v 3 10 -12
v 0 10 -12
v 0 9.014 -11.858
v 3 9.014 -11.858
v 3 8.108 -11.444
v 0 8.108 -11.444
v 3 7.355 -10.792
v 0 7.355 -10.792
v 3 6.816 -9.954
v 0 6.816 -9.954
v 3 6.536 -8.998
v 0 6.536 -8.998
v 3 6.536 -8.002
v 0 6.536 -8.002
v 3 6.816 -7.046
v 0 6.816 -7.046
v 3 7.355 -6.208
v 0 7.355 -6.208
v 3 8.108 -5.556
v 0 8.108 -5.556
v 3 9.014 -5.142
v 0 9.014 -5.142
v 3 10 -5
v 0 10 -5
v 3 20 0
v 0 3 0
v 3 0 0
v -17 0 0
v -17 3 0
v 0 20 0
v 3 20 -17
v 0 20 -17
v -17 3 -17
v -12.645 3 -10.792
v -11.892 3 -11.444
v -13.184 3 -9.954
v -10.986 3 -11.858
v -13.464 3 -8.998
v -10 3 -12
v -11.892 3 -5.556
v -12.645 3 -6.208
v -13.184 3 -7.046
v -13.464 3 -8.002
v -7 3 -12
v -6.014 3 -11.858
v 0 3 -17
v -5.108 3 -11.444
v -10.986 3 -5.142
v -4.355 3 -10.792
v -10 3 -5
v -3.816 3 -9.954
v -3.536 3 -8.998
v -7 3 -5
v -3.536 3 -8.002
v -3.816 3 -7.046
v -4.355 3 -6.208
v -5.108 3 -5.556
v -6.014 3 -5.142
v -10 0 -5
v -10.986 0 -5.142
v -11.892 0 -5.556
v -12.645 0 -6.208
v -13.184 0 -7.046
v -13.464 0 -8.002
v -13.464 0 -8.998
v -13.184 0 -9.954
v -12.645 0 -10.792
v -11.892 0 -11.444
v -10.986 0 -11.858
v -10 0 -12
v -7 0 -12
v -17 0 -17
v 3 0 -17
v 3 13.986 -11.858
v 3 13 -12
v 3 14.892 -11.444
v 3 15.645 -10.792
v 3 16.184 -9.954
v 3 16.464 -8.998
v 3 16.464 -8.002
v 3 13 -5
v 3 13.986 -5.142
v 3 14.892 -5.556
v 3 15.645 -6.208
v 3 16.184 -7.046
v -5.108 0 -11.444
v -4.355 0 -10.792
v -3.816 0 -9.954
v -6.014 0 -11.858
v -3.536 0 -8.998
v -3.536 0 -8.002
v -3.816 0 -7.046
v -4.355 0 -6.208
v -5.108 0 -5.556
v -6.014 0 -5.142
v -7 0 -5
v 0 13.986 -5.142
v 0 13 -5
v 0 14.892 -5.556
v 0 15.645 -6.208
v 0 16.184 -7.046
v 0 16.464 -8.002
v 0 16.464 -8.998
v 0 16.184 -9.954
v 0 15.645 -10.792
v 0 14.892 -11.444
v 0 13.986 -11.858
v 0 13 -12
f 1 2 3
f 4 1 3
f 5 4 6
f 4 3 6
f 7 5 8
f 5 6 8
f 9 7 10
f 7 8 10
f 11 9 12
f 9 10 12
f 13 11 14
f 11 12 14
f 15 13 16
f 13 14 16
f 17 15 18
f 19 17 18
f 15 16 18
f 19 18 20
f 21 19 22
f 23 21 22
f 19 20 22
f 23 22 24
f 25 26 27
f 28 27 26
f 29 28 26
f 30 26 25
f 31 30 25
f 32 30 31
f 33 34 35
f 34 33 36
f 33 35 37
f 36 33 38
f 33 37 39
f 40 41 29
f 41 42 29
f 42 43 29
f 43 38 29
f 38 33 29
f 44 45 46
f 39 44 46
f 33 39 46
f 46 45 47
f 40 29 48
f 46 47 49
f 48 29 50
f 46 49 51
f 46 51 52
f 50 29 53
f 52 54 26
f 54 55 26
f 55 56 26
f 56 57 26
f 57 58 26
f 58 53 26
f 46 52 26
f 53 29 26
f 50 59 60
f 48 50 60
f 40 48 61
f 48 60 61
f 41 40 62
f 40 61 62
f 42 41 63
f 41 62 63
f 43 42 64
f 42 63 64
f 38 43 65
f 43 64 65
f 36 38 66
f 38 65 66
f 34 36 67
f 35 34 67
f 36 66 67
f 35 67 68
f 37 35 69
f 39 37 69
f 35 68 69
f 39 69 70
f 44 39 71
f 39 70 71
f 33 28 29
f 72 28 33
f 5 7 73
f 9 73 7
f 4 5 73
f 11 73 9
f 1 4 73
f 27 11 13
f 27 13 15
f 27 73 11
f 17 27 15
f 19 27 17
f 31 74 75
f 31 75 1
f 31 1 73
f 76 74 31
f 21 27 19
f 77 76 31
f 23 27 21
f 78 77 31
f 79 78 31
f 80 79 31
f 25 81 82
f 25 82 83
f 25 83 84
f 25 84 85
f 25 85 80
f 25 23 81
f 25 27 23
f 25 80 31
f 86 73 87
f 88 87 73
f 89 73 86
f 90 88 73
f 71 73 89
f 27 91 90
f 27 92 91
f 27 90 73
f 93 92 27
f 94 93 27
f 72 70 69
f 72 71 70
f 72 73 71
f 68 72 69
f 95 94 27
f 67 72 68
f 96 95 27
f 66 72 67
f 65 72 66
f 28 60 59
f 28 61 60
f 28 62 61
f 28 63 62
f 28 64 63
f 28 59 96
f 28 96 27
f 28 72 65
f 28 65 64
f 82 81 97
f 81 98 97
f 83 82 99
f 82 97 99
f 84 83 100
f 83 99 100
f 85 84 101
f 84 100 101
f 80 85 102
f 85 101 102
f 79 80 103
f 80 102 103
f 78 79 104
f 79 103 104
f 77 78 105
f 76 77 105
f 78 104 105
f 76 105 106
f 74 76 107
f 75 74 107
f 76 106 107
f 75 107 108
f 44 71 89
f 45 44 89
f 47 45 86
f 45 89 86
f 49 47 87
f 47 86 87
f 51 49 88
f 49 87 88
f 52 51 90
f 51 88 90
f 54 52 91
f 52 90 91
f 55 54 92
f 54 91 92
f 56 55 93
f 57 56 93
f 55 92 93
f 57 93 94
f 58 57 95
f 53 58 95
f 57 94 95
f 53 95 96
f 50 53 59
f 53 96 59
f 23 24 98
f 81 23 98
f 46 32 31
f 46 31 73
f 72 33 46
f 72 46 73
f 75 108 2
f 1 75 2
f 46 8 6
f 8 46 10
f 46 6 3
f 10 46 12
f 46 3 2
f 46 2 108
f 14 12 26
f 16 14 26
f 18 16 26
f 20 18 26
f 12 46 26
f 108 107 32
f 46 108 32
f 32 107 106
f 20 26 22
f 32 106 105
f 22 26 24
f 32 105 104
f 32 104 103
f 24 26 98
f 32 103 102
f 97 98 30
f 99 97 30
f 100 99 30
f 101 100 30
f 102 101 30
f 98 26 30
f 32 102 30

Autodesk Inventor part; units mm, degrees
ref_plane "YZ Plane" through (0, 0, 0) normal (1, 0, 0) x (0, 1, 0)
ref_plane "XZ Plane" through (0, 0, 0) normal (0, 1, 0) x (-1, 0, 0)
ref_plane "XY Plane" through (0, 0, 0) normal (0, 0, 1) x (1, 0, 0)
sketch "Sketch1" plane through (0, 0, 0) normal (1, 0, 0) x (0, 1, 0)
  line L0 (0, 0) -> (20, 0)
  line L1 (20, 0) -> (20, -17)
  line L2 (20, -17) -> (0, -17)
  line L3 (0, -17) -> (0, 0)
  dimension "d0" = 20
  dimension "d1" = 17
extrude "Extrusion1" add sketch "Sketch1" along normal blind 3
sketch "Sketch2" plane through (0, 0, -17) normal (0, -1, 0) x (1, 0, 0)
  line L0 (3, 0) -> (3, 17) projected
  line L1 (3, 17) -> (-17, 17)
  line L2 (-17, 17) -> (-17, 0)
  line L3 (-17, 0) -> (3, 0)
  line L4 (3, 0) -> (3, 17)
  line L5 (-17, 17) -> (-17, 0)
  line L6 (0, 0) -> (-17, 0)
  line L7 (0, 17) -> (0, 0)
  line L8 (-17, 17) -> (0, 17)
  line L9 (-10, 8.5) -> (-7, 8.5) construction
  line L10 (-10, 5) -> (-7, 5)
  line L11 (-7, 12) -> (-10, 12)
  arc A0 (-10, 12) -> (-10, 5) centre (-10, 8.5) ccw
  arc A1 (-7, 5) -> (-7, 12) centre (-7, 8.5) ccw
  point P0 (0, 17)
  point P1 (0, 0)
  point P2 (-8.5, 8.5)
  dimension "d4" = 20
  dimension "d15" = 7
  dimension "d16" = 3
  dimension "d17" = 7
  dimension "d18" = 17
  dimension "d19" = 17
  dimension "d20" = 8.5
extrude "Extrusion2" add sketch "Sketch2" against normal blind 3 contours L3 L7 L1 L0 | L3 L2 L1 L7 | A0 L11 A1 L10
sketch "Sketch3" plane through (0, 0, 0) normal (-1, 0, 0) x (0, 0, 1)
  line L0 (-17, 3) -> (0, 3)
  line L1 (0, 20) -> (0, 3)
  line L2 (-17, 20) -> (0, 20)
  line L3 (-17, 3) -> (-17, 20)
  line L4 (-8.5, 10) -> (-8.5, 13) construction
  line L5 (-5, 10) -> (-5, 13)
  line L6 (-12, 13) -> (-12, 10)
  arc A0 (-12, 10) -> (-5, 10) centre (-8.5, 10) ccw
  arc A1 (-5, 13) -> (-12, 13) centre (-8.5, 13) ccw
  point P0 (0, 0)
  point P1 (-8.5, 11.5)
  dimension "d7" = 7
  dimension "d8" = 3
  dimension "d9" = 7
  dimension "d10" = 17
  dimension "d11" = 17
  dimension "d12" = 8.5
extrude "Extrusion3" cut sketch "Sketch3" against normal blind 3 contours A0 L6 A1 L5
extrude "Extrusion4" cut sketch "Sketch2" against normal blind 3 contours A0 L11 A1 L10
equation "\"d17\" = -0.5 * d16 + 0.5 * d18"
equation "\"d20\" = 0.5 * d19"
equation "\"d9\" = -0.5 * d8 + 0.5 * d10"
equation "\"d12\" = 0.5 * d11"
properties part number "2020RightAngle" material "Aluminum 6061"
